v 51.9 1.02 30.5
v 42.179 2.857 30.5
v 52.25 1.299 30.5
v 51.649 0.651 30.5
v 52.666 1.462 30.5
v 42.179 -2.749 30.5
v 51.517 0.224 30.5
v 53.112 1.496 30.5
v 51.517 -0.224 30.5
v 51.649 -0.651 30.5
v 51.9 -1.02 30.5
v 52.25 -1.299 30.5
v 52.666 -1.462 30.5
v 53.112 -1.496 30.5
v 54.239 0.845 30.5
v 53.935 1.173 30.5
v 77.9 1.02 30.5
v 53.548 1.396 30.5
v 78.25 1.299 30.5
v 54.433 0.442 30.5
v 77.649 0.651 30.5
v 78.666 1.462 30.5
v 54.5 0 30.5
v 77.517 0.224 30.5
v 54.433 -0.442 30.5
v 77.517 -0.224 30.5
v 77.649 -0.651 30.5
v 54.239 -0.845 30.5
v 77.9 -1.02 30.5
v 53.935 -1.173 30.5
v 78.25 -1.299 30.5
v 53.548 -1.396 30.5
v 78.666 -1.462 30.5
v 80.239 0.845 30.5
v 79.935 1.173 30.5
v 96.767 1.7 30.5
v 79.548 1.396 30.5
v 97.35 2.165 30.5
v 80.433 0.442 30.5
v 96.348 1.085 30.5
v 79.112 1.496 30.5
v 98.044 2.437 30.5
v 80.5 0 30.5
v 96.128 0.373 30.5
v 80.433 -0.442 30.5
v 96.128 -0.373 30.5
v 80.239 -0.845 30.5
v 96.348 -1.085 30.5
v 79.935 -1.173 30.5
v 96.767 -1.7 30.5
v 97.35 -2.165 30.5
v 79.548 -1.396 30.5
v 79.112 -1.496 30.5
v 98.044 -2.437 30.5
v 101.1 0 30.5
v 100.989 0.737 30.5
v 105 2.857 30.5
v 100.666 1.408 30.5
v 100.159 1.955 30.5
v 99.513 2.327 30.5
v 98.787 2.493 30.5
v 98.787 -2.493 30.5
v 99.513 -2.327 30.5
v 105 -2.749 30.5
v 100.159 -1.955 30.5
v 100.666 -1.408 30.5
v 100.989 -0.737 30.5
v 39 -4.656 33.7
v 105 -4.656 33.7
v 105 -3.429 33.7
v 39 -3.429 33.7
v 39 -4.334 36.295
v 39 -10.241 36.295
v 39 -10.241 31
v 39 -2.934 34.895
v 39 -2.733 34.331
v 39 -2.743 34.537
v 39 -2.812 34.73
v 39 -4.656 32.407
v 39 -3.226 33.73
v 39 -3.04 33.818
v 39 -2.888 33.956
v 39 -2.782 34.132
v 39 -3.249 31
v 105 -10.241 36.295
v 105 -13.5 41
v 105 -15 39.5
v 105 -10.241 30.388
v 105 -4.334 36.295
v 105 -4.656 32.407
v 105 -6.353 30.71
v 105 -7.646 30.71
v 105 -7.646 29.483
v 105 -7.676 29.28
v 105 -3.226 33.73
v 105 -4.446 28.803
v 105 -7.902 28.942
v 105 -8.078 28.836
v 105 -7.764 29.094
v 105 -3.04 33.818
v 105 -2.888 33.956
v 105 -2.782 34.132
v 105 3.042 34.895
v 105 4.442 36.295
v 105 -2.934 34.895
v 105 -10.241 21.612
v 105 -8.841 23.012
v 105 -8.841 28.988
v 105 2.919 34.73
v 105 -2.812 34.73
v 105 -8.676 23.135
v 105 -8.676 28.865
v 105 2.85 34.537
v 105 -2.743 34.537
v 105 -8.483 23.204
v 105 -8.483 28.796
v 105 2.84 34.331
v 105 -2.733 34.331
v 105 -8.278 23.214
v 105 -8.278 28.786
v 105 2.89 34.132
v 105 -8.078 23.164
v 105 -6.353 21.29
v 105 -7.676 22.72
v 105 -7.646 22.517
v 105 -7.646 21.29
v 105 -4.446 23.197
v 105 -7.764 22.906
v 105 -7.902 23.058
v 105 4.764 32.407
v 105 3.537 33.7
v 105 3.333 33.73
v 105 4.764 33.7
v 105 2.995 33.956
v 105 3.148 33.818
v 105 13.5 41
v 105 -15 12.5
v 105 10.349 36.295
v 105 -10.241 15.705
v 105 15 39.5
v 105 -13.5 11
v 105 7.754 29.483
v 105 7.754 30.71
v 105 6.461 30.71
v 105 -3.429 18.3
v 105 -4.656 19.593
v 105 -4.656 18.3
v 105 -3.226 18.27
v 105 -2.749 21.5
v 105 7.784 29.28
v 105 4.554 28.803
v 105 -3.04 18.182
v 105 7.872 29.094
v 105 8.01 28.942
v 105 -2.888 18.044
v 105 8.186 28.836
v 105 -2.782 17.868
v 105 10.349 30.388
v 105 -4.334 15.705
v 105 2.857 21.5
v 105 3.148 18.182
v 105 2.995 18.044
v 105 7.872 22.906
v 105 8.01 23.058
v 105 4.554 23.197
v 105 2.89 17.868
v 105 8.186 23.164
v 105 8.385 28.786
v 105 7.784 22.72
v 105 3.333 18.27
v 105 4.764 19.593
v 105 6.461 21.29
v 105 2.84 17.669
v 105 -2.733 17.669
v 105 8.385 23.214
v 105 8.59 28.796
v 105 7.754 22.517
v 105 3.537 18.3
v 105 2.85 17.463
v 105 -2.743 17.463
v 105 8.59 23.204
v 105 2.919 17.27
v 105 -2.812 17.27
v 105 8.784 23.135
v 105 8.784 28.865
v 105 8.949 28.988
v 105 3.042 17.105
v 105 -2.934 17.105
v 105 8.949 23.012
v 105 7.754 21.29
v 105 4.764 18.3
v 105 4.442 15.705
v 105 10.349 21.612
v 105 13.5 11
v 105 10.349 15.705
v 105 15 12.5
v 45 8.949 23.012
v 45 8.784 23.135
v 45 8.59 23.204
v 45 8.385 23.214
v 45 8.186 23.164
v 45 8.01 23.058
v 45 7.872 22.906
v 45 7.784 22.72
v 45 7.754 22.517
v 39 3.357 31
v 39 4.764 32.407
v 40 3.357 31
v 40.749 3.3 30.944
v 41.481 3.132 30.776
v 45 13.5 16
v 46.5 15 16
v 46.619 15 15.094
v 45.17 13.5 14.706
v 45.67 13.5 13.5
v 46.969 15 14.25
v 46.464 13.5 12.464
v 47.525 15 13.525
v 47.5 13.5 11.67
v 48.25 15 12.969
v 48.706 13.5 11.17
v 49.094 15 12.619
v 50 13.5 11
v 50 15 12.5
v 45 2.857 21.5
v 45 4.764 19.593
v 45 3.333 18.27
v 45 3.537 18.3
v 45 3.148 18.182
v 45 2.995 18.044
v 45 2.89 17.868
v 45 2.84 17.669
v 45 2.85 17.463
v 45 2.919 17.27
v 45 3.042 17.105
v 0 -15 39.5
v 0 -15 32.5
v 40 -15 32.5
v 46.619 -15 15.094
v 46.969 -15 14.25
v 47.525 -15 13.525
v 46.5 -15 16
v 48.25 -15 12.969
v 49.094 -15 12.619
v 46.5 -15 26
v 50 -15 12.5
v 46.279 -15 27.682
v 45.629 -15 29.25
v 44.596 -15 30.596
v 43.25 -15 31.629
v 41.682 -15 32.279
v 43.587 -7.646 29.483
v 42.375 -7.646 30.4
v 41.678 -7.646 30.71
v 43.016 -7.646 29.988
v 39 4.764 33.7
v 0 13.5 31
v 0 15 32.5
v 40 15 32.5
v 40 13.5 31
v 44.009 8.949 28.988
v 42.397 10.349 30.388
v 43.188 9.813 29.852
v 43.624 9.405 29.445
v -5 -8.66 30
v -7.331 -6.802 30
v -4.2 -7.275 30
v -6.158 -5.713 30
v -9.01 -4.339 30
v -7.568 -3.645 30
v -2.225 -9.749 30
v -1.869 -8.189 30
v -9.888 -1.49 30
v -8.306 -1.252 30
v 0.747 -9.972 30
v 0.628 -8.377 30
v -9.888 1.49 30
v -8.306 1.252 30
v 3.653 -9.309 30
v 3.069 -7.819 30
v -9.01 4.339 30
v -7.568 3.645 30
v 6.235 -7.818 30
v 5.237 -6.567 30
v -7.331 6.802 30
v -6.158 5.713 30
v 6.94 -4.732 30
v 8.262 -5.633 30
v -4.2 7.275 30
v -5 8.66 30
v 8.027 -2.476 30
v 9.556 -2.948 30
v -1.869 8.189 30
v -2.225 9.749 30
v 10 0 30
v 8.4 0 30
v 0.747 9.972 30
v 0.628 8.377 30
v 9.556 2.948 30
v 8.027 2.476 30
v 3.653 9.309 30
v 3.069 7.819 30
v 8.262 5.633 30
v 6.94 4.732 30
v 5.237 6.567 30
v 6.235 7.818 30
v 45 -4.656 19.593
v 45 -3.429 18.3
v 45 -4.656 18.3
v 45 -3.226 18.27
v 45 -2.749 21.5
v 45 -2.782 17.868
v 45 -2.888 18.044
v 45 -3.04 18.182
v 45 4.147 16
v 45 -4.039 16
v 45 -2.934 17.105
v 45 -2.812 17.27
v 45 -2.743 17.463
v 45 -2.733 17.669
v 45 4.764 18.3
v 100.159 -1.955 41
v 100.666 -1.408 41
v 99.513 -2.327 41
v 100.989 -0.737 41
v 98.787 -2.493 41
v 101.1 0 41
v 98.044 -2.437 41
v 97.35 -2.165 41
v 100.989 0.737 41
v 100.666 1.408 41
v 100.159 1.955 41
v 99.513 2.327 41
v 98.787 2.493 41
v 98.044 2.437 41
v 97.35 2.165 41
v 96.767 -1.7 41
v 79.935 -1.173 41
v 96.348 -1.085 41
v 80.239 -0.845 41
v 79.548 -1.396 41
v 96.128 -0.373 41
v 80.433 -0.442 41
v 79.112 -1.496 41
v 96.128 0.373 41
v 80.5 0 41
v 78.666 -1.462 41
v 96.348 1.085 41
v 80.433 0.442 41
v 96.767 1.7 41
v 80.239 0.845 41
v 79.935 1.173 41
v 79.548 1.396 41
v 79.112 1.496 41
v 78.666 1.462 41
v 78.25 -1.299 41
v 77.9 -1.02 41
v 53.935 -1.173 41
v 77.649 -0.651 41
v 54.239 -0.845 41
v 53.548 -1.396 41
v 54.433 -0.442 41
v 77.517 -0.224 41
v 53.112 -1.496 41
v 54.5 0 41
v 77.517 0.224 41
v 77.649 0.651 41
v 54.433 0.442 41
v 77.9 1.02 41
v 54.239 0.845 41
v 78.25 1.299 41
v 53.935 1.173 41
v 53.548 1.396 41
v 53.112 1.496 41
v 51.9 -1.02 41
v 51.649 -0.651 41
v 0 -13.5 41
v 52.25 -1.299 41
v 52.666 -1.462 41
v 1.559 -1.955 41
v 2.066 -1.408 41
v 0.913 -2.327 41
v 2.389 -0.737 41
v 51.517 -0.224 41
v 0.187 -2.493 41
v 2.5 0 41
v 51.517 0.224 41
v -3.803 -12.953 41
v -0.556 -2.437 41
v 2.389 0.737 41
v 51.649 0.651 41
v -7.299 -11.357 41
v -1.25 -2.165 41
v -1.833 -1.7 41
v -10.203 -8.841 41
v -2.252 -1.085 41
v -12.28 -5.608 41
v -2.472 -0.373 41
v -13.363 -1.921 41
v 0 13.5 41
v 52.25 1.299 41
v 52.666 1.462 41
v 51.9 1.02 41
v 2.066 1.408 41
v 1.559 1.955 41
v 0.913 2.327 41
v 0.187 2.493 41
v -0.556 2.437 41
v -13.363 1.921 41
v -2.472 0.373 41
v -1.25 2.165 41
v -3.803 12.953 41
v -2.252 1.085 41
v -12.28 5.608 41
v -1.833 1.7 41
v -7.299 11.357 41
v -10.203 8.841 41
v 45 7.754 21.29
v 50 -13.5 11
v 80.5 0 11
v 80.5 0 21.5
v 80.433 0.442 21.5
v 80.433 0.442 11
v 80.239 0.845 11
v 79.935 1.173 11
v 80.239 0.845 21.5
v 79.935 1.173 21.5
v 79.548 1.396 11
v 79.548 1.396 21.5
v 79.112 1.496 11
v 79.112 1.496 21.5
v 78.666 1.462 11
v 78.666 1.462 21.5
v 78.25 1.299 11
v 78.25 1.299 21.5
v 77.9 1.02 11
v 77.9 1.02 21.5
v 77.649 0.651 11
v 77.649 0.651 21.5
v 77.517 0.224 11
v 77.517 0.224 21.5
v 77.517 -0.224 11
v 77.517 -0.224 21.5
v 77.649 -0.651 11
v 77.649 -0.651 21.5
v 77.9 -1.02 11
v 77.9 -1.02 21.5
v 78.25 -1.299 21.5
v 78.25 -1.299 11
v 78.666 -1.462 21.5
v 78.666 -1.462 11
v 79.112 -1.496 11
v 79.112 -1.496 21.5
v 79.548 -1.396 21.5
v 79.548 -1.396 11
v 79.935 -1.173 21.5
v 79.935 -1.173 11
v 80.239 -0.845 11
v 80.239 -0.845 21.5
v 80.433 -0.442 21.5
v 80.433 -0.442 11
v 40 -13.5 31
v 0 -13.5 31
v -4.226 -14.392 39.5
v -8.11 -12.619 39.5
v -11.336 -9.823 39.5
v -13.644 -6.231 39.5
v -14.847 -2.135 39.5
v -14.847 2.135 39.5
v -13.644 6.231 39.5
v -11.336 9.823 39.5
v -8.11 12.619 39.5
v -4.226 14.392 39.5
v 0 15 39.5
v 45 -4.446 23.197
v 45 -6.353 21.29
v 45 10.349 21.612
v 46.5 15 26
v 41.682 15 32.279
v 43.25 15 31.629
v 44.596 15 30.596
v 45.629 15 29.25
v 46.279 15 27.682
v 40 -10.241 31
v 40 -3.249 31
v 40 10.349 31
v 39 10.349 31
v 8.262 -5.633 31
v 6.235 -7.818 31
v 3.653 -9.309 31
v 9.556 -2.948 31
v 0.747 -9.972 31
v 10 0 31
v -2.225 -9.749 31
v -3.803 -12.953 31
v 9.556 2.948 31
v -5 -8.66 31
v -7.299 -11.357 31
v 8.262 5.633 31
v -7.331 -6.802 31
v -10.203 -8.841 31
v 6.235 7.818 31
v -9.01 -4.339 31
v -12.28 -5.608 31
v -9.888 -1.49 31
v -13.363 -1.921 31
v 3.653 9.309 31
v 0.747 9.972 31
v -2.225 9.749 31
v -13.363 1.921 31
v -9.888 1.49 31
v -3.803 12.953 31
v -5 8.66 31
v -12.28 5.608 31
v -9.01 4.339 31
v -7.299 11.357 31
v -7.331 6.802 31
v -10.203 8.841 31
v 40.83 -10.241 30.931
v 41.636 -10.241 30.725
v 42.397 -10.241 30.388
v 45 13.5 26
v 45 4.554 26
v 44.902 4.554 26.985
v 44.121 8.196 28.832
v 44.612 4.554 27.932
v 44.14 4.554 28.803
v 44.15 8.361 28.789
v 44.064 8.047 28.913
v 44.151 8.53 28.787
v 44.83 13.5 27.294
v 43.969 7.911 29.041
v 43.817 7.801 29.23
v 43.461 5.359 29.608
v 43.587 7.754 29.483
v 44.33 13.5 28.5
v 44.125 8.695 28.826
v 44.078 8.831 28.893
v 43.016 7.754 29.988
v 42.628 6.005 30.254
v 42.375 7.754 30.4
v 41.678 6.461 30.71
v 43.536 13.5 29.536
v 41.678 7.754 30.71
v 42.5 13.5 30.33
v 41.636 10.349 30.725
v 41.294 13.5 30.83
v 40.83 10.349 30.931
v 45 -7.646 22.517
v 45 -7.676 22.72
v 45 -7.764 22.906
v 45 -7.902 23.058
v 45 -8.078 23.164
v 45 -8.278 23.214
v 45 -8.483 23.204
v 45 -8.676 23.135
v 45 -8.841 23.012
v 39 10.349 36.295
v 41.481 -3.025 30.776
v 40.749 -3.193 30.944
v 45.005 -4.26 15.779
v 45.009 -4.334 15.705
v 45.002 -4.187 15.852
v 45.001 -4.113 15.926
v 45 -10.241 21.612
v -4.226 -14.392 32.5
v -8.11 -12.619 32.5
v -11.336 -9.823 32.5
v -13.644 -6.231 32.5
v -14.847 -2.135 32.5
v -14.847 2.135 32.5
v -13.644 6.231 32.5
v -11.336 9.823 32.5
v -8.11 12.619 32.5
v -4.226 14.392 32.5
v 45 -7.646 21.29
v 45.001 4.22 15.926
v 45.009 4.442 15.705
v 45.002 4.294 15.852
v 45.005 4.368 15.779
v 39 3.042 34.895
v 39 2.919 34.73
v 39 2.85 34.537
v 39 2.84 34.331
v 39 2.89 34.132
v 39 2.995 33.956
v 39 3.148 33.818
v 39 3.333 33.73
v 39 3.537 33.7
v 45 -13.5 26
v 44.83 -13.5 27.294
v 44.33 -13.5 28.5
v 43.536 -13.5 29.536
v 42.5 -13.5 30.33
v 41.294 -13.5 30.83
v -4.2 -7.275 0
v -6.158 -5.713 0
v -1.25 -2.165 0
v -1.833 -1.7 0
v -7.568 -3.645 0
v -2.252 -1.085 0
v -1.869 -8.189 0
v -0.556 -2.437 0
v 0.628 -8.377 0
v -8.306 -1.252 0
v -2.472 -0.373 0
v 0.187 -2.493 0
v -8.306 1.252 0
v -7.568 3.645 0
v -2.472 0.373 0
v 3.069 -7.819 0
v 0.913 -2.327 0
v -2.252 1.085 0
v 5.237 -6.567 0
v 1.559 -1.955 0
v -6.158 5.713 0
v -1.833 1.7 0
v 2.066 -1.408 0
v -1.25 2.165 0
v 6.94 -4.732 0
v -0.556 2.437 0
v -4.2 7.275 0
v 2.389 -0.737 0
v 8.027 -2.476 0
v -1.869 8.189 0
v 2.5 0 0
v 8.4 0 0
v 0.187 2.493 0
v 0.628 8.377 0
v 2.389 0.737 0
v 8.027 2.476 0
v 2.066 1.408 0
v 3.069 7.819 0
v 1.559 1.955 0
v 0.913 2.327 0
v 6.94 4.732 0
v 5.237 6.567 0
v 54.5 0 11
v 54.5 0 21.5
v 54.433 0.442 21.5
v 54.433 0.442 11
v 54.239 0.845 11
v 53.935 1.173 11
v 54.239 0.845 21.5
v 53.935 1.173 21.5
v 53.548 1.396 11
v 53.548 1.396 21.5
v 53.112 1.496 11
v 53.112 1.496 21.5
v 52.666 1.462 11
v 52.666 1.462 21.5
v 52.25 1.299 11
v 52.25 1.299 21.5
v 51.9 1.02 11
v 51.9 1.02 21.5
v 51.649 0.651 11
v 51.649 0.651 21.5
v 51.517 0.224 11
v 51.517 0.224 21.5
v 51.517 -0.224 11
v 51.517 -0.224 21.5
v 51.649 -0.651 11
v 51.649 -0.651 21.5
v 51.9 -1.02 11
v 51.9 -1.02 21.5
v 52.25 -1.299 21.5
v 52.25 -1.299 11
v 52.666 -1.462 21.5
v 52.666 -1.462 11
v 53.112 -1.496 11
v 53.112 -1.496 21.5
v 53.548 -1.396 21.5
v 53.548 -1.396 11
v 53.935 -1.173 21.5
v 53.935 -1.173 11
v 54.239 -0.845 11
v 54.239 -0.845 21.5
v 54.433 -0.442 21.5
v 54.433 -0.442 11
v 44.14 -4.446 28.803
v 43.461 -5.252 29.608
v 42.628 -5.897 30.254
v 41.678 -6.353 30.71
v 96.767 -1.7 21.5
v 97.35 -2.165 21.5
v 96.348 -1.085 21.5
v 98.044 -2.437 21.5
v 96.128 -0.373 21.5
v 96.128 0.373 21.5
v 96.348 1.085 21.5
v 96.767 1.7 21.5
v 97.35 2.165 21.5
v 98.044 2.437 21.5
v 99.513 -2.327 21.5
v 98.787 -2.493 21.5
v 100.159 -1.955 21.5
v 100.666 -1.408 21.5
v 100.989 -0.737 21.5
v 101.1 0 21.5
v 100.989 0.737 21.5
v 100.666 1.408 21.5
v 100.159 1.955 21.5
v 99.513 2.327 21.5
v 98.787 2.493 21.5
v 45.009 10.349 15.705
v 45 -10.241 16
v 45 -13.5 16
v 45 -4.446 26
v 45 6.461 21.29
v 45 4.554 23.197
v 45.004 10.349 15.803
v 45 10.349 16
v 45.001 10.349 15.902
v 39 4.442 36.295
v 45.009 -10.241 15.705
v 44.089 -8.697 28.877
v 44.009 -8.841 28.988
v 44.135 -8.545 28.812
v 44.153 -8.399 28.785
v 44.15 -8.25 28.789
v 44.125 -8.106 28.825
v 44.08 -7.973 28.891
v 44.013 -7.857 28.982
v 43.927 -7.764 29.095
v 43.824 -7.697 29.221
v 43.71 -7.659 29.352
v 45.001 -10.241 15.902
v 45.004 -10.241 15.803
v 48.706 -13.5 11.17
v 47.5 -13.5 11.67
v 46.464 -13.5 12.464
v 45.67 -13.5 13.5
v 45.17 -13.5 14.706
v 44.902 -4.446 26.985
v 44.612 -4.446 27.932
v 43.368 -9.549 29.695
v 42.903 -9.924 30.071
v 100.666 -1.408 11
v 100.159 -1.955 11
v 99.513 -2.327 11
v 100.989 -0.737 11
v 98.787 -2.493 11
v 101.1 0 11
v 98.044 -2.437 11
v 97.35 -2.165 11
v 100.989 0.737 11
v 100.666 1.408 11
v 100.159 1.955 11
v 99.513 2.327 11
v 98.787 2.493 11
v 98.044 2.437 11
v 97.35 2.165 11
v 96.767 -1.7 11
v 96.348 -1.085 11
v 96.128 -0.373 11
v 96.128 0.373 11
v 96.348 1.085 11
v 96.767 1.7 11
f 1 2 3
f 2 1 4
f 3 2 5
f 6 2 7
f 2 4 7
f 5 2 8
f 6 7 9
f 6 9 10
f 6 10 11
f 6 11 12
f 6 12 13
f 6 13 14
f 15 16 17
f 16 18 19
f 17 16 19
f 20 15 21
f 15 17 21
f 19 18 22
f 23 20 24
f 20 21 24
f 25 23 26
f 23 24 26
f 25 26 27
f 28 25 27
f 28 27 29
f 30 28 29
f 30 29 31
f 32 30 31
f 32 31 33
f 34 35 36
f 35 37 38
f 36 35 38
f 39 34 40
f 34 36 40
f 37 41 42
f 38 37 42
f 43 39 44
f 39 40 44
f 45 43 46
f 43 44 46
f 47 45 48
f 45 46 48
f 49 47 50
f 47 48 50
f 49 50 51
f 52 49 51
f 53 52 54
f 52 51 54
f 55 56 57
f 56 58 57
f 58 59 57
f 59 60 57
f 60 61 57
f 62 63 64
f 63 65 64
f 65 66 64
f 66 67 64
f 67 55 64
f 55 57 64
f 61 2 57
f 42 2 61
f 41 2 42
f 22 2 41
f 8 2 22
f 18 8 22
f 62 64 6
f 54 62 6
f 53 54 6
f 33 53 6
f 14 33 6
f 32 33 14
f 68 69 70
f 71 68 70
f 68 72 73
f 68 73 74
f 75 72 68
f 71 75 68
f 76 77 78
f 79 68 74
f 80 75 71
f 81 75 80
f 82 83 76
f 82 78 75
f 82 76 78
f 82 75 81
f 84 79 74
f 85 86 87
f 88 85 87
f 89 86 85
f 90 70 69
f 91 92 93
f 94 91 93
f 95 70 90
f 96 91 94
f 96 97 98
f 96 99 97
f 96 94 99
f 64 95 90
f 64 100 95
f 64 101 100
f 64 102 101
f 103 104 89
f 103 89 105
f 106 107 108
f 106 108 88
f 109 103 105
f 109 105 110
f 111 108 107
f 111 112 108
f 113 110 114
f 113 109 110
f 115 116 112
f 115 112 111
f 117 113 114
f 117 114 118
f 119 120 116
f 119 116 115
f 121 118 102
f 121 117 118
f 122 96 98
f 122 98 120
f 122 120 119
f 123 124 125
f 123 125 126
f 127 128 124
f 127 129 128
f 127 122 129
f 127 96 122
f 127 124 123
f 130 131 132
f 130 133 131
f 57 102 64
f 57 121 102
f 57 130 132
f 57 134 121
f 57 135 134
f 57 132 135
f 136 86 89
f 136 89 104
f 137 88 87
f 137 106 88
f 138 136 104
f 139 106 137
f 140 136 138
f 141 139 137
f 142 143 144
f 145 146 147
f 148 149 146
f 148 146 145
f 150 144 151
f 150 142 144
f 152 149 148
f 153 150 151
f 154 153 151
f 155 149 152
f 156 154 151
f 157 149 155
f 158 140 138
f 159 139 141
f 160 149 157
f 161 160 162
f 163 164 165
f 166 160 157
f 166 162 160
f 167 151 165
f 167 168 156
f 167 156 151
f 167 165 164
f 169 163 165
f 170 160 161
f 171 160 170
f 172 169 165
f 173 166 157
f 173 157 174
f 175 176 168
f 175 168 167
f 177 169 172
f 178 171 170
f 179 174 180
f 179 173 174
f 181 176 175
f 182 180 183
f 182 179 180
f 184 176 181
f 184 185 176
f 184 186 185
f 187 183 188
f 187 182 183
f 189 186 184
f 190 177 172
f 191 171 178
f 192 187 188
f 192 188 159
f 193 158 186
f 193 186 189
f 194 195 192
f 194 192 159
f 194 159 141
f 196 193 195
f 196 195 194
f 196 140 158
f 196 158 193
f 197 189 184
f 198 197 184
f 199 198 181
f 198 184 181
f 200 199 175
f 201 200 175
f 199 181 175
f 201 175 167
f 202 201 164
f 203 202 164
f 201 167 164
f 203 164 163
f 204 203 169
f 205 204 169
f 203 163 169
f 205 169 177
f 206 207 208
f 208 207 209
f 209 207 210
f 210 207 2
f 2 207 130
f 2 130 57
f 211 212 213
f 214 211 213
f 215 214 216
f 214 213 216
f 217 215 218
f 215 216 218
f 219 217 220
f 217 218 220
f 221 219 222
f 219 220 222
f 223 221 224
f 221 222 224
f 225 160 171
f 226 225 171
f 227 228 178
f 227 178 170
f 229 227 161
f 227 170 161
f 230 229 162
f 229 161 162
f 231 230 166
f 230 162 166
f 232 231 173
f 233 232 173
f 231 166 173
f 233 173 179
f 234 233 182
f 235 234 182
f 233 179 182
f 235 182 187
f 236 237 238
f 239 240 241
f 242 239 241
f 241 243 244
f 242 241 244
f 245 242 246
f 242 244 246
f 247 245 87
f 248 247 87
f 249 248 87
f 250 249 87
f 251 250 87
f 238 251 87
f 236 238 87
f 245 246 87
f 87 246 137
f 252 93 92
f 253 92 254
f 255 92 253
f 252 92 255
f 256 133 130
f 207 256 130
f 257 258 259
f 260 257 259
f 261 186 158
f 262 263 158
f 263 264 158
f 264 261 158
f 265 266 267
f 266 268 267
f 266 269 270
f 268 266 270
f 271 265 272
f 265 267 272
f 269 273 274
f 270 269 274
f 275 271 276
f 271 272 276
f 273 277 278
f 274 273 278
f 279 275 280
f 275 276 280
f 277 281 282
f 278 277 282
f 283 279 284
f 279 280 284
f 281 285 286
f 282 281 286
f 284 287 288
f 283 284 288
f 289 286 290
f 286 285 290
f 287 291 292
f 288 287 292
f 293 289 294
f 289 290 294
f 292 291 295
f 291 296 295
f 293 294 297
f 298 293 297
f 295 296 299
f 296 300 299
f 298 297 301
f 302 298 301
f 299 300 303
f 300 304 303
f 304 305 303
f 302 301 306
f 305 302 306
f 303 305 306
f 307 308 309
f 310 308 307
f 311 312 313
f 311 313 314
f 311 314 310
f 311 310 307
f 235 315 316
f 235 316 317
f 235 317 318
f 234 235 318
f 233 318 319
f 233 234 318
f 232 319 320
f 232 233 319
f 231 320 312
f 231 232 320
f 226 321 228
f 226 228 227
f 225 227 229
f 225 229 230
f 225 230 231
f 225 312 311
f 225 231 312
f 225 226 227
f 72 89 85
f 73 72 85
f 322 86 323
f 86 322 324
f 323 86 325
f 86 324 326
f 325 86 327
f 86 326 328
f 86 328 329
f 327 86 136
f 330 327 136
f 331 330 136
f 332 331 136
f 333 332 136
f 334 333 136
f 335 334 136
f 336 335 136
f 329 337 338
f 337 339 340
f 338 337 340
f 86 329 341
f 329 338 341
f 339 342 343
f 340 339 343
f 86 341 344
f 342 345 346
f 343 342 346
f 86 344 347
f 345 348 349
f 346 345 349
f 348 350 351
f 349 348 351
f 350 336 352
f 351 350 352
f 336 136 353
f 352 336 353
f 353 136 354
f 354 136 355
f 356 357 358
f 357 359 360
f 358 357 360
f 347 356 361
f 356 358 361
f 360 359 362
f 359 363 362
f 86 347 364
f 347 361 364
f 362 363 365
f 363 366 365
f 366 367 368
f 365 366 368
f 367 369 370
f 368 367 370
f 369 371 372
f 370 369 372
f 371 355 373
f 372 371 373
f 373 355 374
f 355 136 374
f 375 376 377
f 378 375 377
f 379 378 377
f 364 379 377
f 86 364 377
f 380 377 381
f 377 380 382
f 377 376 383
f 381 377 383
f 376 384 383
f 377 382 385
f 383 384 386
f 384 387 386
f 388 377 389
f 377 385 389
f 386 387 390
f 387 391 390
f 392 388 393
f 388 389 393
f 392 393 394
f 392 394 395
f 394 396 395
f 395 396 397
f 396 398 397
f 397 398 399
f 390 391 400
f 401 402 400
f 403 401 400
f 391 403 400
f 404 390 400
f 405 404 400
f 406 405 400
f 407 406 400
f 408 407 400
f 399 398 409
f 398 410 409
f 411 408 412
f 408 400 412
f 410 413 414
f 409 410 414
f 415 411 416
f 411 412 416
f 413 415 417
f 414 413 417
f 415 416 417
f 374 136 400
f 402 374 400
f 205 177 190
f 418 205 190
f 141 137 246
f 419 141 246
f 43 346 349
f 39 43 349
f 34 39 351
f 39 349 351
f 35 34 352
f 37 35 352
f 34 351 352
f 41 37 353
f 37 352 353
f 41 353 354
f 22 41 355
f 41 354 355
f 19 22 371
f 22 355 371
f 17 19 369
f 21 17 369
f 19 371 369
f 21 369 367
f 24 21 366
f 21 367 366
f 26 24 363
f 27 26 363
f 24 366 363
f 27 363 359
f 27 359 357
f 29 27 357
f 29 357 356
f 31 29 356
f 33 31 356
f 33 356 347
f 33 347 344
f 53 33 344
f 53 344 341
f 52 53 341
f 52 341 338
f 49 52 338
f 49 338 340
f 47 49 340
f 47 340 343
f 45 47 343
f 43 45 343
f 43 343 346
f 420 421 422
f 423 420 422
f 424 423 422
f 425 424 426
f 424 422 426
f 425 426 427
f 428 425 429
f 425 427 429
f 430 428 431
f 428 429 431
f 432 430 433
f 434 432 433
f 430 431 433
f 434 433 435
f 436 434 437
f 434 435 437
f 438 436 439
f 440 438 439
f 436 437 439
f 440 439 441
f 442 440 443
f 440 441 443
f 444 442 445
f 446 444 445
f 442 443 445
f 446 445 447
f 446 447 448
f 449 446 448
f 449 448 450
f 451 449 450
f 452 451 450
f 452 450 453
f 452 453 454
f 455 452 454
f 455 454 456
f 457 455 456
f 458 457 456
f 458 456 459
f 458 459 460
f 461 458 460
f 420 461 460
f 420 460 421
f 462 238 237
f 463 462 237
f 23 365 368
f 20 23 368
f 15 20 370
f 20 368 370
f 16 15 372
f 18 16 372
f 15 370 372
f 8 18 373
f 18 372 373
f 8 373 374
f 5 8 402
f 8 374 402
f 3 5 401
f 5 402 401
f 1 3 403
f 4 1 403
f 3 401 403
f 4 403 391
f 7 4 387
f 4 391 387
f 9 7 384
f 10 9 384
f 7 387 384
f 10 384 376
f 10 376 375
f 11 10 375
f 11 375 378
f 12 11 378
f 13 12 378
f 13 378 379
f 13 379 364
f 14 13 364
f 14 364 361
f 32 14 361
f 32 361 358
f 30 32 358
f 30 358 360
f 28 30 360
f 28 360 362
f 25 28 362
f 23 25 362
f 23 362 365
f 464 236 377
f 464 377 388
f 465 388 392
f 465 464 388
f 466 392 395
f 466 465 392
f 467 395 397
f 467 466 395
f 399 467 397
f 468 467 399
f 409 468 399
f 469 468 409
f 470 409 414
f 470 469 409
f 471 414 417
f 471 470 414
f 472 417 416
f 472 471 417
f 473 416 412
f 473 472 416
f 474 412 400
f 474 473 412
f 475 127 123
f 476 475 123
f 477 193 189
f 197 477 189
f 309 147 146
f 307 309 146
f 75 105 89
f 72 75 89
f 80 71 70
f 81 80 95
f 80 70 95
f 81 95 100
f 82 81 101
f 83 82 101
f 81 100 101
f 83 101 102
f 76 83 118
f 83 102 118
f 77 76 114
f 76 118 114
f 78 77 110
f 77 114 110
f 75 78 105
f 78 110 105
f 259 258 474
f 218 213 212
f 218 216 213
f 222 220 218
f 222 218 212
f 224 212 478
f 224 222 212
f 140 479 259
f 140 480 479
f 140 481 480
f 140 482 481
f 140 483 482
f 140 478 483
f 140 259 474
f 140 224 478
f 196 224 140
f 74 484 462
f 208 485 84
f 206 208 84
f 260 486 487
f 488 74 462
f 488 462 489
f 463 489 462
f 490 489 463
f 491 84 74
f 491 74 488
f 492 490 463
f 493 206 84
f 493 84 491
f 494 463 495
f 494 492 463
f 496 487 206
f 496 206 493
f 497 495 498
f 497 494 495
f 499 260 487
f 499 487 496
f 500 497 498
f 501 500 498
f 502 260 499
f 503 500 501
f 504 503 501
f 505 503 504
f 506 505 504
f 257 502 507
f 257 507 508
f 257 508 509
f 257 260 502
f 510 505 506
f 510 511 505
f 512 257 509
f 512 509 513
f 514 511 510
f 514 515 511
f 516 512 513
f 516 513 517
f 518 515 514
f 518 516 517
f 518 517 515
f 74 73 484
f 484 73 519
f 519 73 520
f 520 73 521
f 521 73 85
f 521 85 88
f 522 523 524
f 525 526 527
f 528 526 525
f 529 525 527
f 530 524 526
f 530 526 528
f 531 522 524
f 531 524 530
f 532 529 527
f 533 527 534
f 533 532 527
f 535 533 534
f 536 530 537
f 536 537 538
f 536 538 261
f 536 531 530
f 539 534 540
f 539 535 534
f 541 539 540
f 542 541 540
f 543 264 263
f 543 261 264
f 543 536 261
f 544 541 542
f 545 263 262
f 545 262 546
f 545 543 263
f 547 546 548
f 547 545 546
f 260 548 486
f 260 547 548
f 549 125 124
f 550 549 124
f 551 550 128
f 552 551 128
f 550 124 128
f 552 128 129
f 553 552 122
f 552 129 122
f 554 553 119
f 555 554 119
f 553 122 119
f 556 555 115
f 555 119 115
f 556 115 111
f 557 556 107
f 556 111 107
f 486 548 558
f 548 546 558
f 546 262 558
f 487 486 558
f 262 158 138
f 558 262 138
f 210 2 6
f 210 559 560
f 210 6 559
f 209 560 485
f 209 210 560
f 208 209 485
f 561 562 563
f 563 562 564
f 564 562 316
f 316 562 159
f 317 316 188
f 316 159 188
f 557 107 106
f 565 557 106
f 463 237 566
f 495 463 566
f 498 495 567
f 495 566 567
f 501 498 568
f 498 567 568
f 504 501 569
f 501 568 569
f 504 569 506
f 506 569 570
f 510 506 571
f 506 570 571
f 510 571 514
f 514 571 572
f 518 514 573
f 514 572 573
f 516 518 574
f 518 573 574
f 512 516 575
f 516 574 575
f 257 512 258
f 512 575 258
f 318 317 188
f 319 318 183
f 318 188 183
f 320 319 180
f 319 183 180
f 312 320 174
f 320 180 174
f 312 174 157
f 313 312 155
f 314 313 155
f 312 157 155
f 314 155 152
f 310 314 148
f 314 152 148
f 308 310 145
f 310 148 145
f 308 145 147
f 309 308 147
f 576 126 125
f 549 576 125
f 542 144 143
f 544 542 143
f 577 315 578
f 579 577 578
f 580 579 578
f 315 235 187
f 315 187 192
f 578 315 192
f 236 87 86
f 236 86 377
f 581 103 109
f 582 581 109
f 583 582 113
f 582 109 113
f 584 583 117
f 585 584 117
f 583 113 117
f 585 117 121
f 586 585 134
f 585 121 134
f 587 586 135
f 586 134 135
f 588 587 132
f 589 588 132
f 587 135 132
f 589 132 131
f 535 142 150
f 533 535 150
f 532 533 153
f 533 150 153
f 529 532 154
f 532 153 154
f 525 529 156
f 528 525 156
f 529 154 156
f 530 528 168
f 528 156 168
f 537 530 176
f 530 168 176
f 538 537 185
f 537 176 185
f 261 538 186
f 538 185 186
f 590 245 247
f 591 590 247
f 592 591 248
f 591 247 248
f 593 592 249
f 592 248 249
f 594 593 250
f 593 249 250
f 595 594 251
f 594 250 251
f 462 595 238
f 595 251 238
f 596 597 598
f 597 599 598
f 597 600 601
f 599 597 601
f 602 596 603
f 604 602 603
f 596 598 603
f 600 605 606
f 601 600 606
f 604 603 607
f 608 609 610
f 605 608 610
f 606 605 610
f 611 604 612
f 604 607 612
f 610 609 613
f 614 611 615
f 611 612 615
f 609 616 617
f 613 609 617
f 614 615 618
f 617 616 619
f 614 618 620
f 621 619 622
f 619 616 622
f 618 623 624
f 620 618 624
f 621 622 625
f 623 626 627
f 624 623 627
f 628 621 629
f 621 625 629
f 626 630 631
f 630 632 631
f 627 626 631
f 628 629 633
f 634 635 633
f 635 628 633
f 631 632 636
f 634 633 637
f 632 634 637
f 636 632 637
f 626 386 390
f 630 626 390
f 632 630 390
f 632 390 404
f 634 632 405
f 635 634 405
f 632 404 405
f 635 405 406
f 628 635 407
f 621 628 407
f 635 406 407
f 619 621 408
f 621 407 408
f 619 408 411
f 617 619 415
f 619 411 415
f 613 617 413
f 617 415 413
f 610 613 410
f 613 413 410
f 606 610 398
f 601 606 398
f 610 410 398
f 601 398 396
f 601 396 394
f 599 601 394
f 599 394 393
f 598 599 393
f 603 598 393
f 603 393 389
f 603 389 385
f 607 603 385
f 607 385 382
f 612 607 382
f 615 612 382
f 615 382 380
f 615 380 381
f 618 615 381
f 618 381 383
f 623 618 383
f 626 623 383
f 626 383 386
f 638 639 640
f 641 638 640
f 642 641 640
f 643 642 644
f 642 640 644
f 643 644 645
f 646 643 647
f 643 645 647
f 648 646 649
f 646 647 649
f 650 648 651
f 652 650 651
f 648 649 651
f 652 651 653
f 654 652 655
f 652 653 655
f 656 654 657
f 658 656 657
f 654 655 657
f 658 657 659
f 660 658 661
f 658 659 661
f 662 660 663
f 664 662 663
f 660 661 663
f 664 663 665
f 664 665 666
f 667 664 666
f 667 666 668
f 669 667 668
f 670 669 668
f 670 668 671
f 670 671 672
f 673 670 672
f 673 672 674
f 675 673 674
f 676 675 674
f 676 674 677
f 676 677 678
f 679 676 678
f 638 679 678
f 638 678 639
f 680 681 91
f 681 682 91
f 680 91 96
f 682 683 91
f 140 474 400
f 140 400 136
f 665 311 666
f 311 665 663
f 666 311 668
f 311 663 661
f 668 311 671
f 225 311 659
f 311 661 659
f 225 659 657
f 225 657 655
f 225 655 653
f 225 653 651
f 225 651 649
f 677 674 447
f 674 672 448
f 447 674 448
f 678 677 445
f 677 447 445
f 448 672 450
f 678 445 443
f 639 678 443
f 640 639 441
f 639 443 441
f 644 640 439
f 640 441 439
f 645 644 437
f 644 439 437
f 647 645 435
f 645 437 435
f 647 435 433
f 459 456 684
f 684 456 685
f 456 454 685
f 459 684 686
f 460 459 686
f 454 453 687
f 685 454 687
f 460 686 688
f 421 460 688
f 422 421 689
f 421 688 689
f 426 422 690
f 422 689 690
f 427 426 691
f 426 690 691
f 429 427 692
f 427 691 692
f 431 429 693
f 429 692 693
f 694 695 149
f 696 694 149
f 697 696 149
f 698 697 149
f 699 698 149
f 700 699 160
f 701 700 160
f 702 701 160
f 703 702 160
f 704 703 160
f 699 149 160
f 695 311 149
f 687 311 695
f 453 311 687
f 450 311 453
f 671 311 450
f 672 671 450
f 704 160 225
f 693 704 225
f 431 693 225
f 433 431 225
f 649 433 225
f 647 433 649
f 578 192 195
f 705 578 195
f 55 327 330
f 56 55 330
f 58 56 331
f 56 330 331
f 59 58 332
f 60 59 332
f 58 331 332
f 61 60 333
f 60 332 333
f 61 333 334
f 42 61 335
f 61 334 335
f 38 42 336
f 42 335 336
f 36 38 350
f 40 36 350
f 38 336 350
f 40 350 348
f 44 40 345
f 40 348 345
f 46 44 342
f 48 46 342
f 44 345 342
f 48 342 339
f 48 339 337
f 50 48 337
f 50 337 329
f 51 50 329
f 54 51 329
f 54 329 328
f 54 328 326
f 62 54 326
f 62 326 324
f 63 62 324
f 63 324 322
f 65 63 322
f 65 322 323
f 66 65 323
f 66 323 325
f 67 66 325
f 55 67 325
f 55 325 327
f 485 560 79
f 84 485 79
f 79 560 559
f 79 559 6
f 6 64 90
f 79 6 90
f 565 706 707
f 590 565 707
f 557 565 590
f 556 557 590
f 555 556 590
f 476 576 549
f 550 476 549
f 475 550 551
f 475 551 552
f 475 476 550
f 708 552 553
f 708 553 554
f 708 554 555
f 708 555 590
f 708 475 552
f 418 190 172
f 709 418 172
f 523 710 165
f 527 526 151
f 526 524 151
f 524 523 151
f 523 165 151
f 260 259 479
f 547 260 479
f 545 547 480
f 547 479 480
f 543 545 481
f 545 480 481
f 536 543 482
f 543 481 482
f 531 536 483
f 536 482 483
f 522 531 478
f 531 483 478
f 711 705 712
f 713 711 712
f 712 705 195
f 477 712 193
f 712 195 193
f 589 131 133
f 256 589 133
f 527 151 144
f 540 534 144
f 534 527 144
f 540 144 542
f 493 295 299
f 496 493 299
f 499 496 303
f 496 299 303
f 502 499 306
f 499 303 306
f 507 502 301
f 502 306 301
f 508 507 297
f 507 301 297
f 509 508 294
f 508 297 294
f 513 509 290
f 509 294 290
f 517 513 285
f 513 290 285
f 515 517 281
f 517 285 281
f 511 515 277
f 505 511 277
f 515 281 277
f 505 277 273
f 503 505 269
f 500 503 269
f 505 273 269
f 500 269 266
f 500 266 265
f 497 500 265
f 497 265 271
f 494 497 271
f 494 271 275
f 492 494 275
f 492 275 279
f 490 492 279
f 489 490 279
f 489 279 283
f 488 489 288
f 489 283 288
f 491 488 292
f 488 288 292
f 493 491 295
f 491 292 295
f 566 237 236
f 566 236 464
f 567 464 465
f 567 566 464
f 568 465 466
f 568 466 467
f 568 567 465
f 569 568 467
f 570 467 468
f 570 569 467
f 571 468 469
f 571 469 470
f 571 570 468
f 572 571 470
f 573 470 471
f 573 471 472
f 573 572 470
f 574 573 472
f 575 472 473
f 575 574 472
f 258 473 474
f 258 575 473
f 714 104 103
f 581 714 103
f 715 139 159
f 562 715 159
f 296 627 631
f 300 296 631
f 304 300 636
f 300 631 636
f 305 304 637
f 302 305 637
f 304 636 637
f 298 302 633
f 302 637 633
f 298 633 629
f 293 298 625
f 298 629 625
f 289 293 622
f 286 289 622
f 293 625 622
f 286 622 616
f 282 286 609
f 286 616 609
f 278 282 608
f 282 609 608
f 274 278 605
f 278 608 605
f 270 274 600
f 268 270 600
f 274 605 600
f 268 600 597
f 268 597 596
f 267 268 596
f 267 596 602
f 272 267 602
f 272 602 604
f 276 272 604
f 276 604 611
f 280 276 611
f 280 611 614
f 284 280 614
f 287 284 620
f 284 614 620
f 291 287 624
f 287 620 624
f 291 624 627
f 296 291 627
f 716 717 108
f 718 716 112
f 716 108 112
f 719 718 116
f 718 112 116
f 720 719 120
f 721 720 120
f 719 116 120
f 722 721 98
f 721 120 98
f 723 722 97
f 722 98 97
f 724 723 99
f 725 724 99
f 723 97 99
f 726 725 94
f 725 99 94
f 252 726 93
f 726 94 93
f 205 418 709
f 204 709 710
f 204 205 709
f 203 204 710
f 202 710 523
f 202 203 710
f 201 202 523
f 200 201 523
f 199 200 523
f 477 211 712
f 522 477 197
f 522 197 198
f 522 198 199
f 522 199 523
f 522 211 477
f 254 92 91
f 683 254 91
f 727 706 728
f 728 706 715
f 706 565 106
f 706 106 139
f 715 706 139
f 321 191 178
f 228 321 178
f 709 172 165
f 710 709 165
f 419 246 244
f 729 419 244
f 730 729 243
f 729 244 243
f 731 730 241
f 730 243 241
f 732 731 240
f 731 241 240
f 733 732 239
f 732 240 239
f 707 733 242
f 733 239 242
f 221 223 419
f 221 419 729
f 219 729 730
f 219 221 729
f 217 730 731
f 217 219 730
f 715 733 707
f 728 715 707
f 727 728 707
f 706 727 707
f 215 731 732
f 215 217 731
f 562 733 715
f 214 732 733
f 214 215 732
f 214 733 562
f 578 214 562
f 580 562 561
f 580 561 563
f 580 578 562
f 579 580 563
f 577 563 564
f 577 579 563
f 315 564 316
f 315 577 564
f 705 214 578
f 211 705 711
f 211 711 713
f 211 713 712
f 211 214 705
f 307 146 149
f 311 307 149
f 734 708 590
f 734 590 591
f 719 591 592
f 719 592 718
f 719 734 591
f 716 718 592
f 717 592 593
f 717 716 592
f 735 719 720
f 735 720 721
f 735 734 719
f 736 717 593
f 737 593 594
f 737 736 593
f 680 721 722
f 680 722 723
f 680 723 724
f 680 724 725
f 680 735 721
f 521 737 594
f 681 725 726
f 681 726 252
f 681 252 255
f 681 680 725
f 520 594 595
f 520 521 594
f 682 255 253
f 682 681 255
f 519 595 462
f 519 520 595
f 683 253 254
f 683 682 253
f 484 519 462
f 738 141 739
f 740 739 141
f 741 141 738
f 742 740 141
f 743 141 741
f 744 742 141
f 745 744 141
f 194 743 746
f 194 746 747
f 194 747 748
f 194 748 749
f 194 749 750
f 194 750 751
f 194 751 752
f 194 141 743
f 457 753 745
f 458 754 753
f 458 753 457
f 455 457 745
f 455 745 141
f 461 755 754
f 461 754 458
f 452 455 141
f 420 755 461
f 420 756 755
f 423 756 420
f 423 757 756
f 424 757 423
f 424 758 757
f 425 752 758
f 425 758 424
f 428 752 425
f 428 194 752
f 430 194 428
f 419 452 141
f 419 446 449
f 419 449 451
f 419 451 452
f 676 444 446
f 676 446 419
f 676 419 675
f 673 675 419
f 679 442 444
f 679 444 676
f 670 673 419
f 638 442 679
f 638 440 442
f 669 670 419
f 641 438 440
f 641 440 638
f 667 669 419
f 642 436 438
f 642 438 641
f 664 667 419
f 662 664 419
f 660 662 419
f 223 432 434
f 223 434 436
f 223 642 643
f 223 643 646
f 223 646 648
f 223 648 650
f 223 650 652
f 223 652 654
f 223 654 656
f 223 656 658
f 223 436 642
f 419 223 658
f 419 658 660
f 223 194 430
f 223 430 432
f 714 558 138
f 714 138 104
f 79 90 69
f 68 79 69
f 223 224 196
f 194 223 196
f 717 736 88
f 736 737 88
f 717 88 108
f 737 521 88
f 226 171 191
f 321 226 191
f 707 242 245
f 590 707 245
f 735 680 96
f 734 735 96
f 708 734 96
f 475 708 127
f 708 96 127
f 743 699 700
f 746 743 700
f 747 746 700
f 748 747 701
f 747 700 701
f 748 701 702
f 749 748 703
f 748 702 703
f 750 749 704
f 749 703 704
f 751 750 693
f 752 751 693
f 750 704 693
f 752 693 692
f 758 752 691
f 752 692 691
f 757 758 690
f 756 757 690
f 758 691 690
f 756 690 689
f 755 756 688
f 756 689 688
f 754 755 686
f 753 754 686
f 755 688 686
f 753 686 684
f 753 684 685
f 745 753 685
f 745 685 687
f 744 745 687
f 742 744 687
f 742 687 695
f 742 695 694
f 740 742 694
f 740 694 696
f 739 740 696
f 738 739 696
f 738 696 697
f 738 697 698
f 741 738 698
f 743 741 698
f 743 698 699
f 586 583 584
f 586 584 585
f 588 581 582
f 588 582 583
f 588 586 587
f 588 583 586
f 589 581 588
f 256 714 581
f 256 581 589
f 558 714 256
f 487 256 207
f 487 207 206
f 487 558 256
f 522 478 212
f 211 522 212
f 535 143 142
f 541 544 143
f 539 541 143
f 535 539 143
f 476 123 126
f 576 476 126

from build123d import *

# Parameters (mm, degrees)
SKETCH1_R           = 8.4
BOSS_EXTRUDE1_DEPTH = 30
SKETCH3_R           = 10
BOSS_EXTRUDE2_DEPTH = 1
BOSS_EXTRUDE3_DEPTH = 10
BOSS_EXTRUDE4_DEPTH = 30
CUT_EXTRUDE1_DEPTH  = 66
CHAMFER1_SIZE       = 1.5
SKETCH7_R           = 1.5
SKETCH7_R_2         = 2.5
CUT_EXTRUDE2_DEPTH  = 42


with BuildPart() as part:
    # Sketch1 → Boss-Extrude1 (new body)
    with BuildSketch(Plane.XY):
        Circle(SKETCH1_R)
    extrude(amount=BOSS_EXTRUDE1_DEPTH)

    # Sketch3 → Boss-Extrude2 (add)
    with BuildSketch(Plane.XY.offset(30)):
        Circle(SKETCH3_R)
    extrude(amount=BOSS_EXTRUDE2_DEPTH)

    # Sketch4 → Boss-Extrude3 (add)
    with BuildSketch(Plane.XY.offset(31)):
        with BuildLine():
            Line((0, 15), (105, 15))
            Line((105, 15), (105, -15))
            Line((105, -15), (0, -15))
            ThreePointArc((0, -15), (-15, 0), (0, 15))
        make_face()
    extrude(amount=BOSS_EXTRUDE3_DEPTH)

    # Sketch5 → Boss-Extrude4 (add)
    with BuildSketch(Plane(origin=(0, 15, 0), x_dir=(1, 0, 0), z_dir=(0, 1, 0))):
        with BuildLine():
            Line((40, -31), (105, -31))
            Line((105, -31), (105, -11))
            Line((105, -11), (50, -11))
            ThreePointArc((50, -11), (46.464466094, -12.464466094), (45, -16))
            Line((45, -16), (45, -26))
            ThreePointArc((45, -26), (43.535533906, -29.535533906), (40, -31))
        make_face()
    extrude(amount=-BOSS_EXTRUDE4_DEPTH)

    # Sketch6 → Cut-Extrude1 (cut)
    with BuildSketch(Plane(origin=(105, 0, 0), x_dir=(0, 0, -1), z_dir=(1, 0, 0))):
        with BuildLine():
            Line((-23.197056275, 4.553712276), (-28.802943725, 4.553712276))
            Line((-28.802943725, 4.553712276), (-30.710050506, 6.460819058))
            Line((-30.710050506, 6.460819058), (-30.710050506, 7.753712276))
            Line((-30.710050506, 7.753712276), (-29.482842712, 7.753712276))
            ThreePointArc((-29.482842712, 7.753712276), (-28.83612704, 8.185833874), (-28.987867966, 8.948687023))
            Line((-28.987867966, 8.948687023), (-30.387867966, 10.348687023))
            Line((-30.387867966, 10.348687023), (-36.294974747, 10.348687023))
            Line((-36.294974747, 10.348687023), (-36.294974747, 4.441580242))
            Line((-36.294974747, 4.441580242), (-34.894974747, 3.041580242))
            ThreePointArc((-34.894974747, 3.041580242), (-34.132121597, 2.889839316), (-33.7, 3.536554989))
            Line((-33.7, 3.536554989), (-33.7, 4.763762783))
            Line((-33.7, 4.763762783), (-32.407106781, 4.763762783))
            Line((-32.407106781, 4.763762783), (-30.5, 2.856656002))
            Line((-30.5, 2.856656002), (-30.5, -2.749231449))
            Line((-30.5, -2.749231449), (-32.407106781, -4.65633823))
            Line((-32.407106781, -4.65633823), (-33.7, -4.65633823))
            Line((-33.7, -4.65633823), (-33.7, -3.429130436))
            ThreePointArc((-33.7, -3.429130436), (-34.132121597, -2.782414763), (-34.894974747, -2.934155689))
            Line((-34.894974747, -2.934155689), (-36.294974747, -4.334155689))
            Line((-36.294974747, -4.334155689), (-36.294974747, -10.24126247))
            Line((-36.294974747, -10.24126247), (-30.387867966, -10.24126247))
            Line((-30.387867966, -10.24126247), (-28.987867966, -8.84126247))
            ThreePointArc((-28.987867966, -8.84126247), (-28.83612704, -8.078409321), (-29.482842712, -7.646287724))
            Line((-29.482842712, -7.646287724), (-30.710050506, -7.646287724))
            Line((-30.710050506, -7.646287724), (-30.710050506, -6.353394505))
            Line((-30.710050506, -6.353394505), (-28.802943725, -4.446287724))
            Line((-28.802943725, -4.446287724), (-23.197056275, -4.446287724))
            Line((-23.197056275, -4.446287724), (-21.289949494, -6.353394505))
            Line((-21.289949494, -6.353394505), (-21.289949494, -7.646287724))
            Line((-21.289949494, -7.646287724), (-22.517157288, -7.646287724))
            ThreePointArc((-22.517157288, -7.646287724), (-23.16387296, -8.078409321), (-23.012132034, -8.84126247))
            Line((-23.012132034, -8.84126247), (-21.612132034, -10.24126247))
            Line((-21.612132034, -10.24126247), (-15.705025253, -10.24126247))
            Line((-15.705025253, -10.24126247), (-15.705025253, -4.334155689))
            Line((-15.705025253, -4.334155689), (-17.105025253, -2.934155689))
            ThreePointArc((-17.105025253, -2.934155689), (-17.867878403, -2.782414763), (-18.3, -3.429130436))
            Line((-18.3, -3.429130436), (-18.3, -4.65633823))
            Line((-18.3, -4.65633823), (-19.592893219, -4.65633823))
            Line((-19.592893219, -4.65633823), (-21.5, -2.749231449))
            Line((-21.5, -2.749231449), (-21.5, 2.856656002))
            Line((-21.5, 2.856656002), (-19.592893219, 4.763762783))
            Line((-19.592893219, 4.763762783), (-18.3, 4.763762783))
            Line((-18.3, 4.763762783), (-18.3, 3.536554989))
            ThreePointArc((-18.3, 3.536554989), (-17.867878403, 2.889839316), (-17.105025253, 3.041580242))
            Line((-17.105025253, 3.041580242), (-15.705025253, 4.441580242))
            Line((-15.705025253, 4.441580242), (-15.705025253, 10.348687023))
            Line((-15.705025253, 10.348687023), (-21.612132034, 10.348687023))
            Line((-21.612132034, 10.348687023), (-23.012132034, 8.948687023))
            ThreePointArc((-23.012132034, 8.948687023), (-23.16387296, 8.185833874), (-22.517157288, 7.753712276))
            Line((-22.517157288, 7.753712276), (-21.289949494, 7.753712276))
            Line((-21.289949494, 7.753712276), (-21.289949494, 6.460819058))
            Line((-21.289949494, 6.460819058), (-23.197056275, 4.553712276))
        make_face()
    extrude(amount=-CUT_EXTRUDE1_DEPTH, mode=Mode.SUBTRACT)

    # Chamfer1
    chamfer1_edges = [part.edges().sort_by_distance(p)[0] for p in [
        (-15, 0, 31),
        (20, -15, 31),
        (-15, 0, 41),
        (52.5, -15, 41),
        (52.5, 15, 41),
        (20, 15, 31),
        (43.535533906, -15, 29.535533906),
        (45, -15, 21),
        (46.464466094, -15, 12.464466094),
        (77.5, -15, 11),
        (77.5, 15, 11),
        (46.464466094, 15, 12.464466094),
        (45, 15, 21),
        (43.535533906, 15, 29.535533906),
    ]]
    chamfer(chamfer1_edges, length=CHAMFER1_SIZE)

    # Sketch7 → Cut-Extrude2 (cut, through all)
    with BuildSketch(Plane.XY.offset(41)):
        with Locations((53, 0)):
            Circle(SKETCH7_R)
        with Locations((79, 0)):
            Circle(SKETCH7_R)
        with Locations((98.6, 0)):
            Circle(SKETCH7_R_2)
        Circle(SKETCH7_R_2)
    extrude(amount=-CUT_EXTRUDE2_DEPTH, mode=Mode.SUBTRACT)


solid = part.part
